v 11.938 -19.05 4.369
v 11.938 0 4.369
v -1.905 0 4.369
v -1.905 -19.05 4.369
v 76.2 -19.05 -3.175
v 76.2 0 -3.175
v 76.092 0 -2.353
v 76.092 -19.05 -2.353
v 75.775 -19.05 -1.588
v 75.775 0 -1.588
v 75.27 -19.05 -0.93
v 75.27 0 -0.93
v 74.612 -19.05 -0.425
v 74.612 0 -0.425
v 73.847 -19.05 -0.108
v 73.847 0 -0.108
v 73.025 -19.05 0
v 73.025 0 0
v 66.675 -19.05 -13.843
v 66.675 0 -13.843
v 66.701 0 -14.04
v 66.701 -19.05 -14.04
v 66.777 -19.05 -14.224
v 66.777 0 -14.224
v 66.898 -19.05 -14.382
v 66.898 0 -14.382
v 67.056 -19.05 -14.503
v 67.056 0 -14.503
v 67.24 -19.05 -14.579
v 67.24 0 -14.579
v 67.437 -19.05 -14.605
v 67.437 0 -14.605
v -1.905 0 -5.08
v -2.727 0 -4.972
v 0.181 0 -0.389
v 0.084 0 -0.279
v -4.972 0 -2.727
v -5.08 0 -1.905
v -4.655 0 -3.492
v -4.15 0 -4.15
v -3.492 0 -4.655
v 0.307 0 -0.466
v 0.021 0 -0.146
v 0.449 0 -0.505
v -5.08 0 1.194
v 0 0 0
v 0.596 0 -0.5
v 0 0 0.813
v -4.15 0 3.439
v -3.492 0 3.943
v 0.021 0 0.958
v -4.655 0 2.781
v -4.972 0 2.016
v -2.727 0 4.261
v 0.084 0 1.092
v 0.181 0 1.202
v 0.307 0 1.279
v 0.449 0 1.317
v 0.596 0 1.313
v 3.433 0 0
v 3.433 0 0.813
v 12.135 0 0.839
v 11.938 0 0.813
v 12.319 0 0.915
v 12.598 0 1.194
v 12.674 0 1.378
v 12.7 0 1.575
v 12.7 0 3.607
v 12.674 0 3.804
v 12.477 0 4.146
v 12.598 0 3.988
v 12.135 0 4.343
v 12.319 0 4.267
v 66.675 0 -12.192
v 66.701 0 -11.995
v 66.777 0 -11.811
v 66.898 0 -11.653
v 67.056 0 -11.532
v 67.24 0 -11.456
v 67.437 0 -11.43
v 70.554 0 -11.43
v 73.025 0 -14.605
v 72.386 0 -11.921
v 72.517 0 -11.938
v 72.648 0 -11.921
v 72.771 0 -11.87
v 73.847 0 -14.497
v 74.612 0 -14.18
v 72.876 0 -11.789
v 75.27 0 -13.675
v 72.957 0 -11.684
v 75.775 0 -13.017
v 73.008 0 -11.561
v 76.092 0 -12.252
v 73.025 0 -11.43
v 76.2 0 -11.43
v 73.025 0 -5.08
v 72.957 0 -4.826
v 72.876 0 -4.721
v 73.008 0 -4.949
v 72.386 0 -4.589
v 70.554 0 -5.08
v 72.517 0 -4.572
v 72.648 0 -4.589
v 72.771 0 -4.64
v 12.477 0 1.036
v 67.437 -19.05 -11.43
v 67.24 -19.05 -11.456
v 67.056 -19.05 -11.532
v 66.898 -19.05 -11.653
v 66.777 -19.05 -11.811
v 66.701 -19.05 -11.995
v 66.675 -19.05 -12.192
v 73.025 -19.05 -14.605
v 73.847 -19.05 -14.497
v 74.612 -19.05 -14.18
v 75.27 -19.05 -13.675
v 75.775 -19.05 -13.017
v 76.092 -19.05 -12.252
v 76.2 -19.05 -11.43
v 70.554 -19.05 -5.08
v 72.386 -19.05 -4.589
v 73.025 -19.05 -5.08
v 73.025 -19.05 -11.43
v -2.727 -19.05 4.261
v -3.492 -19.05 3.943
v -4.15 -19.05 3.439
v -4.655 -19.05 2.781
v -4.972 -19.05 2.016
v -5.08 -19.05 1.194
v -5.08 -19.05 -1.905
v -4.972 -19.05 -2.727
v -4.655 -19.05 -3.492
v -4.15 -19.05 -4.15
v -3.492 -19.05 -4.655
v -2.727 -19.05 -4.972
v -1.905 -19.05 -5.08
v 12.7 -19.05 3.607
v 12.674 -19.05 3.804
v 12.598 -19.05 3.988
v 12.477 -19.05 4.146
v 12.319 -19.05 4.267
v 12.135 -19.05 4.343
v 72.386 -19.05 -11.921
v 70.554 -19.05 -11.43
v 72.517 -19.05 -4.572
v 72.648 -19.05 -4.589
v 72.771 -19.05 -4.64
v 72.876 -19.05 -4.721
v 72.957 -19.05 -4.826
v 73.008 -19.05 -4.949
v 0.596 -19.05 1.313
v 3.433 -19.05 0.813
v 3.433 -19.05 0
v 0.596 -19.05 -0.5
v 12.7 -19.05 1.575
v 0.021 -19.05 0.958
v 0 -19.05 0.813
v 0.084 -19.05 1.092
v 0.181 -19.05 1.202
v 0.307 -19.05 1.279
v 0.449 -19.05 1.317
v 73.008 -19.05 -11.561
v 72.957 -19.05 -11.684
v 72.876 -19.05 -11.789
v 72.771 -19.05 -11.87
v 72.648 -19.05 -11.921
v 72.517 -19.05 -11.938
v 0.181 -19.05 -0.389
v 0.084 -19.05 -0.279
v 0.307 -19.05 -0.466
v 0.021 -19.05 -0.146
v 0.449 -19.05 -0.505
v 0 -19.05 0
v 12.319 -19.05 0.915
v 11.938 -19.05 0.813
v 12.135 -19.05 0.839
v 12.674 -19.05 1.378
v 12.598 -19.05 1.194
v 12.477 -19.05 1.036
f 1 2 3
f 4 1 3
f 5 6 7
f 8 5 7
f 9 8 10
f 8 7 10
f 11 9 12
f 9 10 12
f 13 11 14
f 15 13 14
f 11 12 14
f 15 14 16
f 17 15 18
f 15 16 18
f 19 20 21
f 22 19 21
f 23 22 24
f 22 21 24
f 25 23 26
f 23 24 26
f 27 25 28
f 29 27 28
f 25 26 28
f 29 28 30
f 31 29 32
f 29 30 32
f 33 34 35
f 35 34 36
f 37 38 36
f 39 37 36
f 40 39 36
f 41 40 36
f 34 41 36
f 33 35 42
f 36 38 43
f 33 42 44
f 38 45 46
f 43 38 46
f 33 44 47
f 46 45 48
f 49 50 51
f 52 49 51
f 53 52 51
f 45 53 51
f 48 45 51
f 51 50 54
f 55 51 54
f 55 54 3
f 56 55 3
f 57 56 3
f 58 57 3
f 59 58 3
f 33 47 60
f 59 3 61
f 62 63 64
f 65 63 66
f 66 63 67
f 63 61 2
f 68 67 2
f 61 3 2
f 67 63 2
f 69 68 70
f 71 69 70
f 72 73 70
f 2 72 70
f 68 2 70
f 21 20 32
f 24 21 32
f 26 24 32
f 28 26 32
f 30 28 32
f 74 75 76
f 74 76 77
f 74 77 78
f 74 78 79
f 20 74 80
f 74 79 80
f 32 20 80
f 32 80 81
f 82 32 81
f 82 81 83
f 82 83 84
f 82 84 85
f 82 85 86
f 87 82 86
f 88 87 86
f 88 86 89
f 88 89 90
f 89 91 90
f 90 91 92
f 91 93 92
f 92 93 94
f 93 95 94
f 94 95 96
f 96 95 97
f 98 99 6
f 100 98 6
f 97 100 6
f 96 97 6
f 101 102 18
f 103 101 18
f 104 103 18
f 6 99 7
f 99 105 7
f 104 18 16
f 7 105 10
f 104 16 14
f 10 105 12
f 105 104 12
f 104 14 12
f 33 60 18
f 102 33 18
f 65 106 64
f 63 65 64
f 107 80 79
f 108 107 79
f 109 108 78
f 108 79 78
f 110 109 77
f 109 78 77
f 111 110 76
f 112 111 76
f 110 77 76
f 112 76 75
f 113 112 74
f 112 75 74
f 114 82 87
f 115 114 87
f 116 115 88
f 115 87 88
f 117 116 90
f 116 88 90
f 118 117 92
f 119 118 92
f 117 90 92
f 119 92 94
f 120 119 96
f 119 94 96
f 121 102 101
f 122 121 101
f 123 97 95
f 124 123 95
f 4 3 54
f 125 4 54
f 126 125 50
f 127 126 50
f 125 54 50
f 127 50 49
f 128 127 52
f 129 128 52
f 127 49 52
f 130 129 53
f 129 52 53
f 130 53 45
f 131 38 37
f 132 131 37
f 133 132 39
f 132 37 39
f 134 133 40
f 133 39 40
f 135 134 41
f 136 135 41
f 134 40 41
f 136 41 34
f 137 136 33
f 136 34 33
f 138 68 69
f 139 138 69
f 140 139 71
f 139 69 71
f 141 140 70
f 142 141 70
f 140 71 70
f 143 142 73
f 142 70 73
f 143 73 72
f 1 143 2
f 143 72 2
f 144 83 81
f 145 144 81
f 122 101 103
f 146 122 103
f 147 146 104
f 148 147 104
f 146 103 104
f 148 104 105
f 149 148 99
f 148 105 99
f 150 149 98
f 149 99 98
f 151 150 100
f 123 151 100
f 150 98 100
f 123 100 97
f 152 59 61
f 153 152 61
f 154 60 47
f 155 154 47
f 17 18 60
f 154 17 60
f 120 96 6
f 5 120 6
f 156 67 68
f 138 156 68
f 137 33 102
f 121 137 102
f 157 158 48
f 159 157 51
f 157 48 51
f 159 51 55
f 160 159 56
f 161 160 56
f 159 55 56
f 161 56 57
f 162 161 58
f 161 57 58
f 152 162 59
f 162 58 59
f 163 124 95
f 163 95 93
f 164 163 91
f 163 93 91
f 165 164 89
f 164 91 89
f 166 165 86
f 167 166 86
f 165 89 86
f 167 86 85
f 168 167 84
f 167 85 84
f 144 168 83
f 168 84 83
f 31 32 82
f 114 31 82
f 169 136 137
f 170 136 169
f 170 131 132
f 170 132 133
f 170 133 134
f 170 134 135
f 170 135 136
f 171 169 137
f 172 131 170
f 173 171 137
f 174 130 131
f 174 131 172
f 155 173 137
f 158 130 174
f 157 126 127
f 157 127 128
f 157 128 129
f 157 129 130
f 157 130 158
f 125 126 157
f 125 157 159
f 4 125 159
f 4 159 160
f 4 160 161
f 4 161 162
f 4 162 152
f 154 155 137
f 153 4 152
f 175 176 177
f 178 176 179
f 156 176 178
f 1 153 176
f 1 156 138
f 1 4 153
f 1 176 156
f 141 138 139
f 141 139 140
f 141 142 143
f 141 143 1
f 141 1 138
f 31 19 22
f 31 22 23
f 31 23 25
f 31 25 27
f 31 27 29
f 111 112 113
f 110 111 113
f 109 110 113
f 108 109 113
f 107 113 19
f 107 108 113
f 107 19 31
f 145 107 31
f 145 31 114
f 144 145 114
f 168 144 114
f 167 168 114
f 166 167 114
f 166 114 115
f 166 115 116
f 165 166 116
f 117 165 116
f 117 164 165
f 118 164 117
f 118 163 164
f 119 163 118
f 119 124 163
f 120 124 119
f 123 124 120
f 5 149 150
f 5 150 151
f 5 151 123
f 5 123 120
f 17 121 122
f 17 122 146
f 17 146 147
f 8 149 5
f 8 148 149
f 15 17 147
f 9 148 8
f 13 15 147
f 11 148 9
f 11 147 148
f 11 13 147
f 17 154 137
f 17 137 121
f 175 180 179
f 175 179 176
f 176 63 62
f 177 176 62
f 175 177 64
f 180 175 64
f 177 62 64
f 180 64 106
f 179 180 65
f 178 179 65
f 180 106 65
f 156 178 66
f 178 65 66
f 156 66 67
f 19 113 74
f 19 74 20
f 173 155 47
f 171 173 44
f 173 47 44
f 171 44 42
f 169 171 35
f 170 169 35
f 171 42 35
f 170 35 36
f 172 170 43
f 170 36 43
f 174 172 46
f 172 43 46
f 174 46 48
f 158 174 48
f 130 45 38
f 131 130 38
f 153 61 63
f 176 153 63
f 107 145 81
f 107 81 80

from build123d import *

# Parameters (mm, degrees)
F1_DEPTH = 19.05


with BuildPart() as f1:
    # F0 (on Front) → F1 (new body)
    with BuildSketch(Plane.XZ):
        with BuildLine():
            Line((3.433455, 0.8128), (11.938, 0.8128))
            ThreePointArc((11.938, 0.8128), (12.476815, 1.035985), (12.7, 1.5748))
            Line((12.7, 1.5748), (12.7, 3.6068))
            ThreePointArc((12.7, 3.6068), (12.476815, 4.145615), (11.938, 4.3688))
            Line((11.938, 4.3688), (-1.905, 4.3688))
            ThreePointArc((-1.905, 4.3688), (-4.150064, 3.438864), (-5.08, 1.1938))
            Line((-5.08, 1.1938), (-5.08, -1.905))
            ThreePointArc((-5.08, -1.905), (-4.150064, -4.150064), (-1.905, -5.08))
            Line((-1.905, -5.08), (70.554239, -5.08))
            Line((70.554239, -5.08), (72.38552, -4.58931))
            ThreePointArc((72.38552, -4.58931), (72.826251, -4.676977), (73.025, -5.08))
            Line((73.025, -5.08), (73.025, -11.43))
            ThreePointArc((73.025, -11.43), (72.826251, -11.833023), (72.38552, -11.92069))
            Line((72.38552, -11.92069), (70.554239, -11.43))
            Line((70.554239, -11.43), (67.437, -11.43))
            ThreePointArc((67.437, -11.43), (66.898185, -11.653185), (66.675, -12.192))
            Line((66.675, -12.192), (66.675, -13.843))
            ThreePointArc((66.675, -13.843), (66.898185, -14.381815), (67.437, -14.605))
            Line((67.437, -14.605), (73.025, -14.605))
            ThreePointArc((73.025, -14.605), (75.270064, -13.675064), (76.2, -11.43))
            Line((76.2, -11.43), (76.2, -3.175))
            ThreePointArc((76.2, -3.175), (75.270064, -0.929936), (73.025, 0))
            Line((73.025, 0), (3.433455, 0))
            Line((3.433455, 0), (0.596213, -0.500282))
            ThreePointArc((0.596213, -0.500282), (0.181464, -0.389151), (0, 0))
            Line((0, 0), (0, 0.8128))
            ThreePointArc((0, 0.8128), (0.181464, 1.201951), (0.596213, 1.313082))
            Line((0.596213, 1.313082), (3.433455, 0.8128))
        make_face()
    extrude(amount=F1_DEPTH)


solid = f1.part
